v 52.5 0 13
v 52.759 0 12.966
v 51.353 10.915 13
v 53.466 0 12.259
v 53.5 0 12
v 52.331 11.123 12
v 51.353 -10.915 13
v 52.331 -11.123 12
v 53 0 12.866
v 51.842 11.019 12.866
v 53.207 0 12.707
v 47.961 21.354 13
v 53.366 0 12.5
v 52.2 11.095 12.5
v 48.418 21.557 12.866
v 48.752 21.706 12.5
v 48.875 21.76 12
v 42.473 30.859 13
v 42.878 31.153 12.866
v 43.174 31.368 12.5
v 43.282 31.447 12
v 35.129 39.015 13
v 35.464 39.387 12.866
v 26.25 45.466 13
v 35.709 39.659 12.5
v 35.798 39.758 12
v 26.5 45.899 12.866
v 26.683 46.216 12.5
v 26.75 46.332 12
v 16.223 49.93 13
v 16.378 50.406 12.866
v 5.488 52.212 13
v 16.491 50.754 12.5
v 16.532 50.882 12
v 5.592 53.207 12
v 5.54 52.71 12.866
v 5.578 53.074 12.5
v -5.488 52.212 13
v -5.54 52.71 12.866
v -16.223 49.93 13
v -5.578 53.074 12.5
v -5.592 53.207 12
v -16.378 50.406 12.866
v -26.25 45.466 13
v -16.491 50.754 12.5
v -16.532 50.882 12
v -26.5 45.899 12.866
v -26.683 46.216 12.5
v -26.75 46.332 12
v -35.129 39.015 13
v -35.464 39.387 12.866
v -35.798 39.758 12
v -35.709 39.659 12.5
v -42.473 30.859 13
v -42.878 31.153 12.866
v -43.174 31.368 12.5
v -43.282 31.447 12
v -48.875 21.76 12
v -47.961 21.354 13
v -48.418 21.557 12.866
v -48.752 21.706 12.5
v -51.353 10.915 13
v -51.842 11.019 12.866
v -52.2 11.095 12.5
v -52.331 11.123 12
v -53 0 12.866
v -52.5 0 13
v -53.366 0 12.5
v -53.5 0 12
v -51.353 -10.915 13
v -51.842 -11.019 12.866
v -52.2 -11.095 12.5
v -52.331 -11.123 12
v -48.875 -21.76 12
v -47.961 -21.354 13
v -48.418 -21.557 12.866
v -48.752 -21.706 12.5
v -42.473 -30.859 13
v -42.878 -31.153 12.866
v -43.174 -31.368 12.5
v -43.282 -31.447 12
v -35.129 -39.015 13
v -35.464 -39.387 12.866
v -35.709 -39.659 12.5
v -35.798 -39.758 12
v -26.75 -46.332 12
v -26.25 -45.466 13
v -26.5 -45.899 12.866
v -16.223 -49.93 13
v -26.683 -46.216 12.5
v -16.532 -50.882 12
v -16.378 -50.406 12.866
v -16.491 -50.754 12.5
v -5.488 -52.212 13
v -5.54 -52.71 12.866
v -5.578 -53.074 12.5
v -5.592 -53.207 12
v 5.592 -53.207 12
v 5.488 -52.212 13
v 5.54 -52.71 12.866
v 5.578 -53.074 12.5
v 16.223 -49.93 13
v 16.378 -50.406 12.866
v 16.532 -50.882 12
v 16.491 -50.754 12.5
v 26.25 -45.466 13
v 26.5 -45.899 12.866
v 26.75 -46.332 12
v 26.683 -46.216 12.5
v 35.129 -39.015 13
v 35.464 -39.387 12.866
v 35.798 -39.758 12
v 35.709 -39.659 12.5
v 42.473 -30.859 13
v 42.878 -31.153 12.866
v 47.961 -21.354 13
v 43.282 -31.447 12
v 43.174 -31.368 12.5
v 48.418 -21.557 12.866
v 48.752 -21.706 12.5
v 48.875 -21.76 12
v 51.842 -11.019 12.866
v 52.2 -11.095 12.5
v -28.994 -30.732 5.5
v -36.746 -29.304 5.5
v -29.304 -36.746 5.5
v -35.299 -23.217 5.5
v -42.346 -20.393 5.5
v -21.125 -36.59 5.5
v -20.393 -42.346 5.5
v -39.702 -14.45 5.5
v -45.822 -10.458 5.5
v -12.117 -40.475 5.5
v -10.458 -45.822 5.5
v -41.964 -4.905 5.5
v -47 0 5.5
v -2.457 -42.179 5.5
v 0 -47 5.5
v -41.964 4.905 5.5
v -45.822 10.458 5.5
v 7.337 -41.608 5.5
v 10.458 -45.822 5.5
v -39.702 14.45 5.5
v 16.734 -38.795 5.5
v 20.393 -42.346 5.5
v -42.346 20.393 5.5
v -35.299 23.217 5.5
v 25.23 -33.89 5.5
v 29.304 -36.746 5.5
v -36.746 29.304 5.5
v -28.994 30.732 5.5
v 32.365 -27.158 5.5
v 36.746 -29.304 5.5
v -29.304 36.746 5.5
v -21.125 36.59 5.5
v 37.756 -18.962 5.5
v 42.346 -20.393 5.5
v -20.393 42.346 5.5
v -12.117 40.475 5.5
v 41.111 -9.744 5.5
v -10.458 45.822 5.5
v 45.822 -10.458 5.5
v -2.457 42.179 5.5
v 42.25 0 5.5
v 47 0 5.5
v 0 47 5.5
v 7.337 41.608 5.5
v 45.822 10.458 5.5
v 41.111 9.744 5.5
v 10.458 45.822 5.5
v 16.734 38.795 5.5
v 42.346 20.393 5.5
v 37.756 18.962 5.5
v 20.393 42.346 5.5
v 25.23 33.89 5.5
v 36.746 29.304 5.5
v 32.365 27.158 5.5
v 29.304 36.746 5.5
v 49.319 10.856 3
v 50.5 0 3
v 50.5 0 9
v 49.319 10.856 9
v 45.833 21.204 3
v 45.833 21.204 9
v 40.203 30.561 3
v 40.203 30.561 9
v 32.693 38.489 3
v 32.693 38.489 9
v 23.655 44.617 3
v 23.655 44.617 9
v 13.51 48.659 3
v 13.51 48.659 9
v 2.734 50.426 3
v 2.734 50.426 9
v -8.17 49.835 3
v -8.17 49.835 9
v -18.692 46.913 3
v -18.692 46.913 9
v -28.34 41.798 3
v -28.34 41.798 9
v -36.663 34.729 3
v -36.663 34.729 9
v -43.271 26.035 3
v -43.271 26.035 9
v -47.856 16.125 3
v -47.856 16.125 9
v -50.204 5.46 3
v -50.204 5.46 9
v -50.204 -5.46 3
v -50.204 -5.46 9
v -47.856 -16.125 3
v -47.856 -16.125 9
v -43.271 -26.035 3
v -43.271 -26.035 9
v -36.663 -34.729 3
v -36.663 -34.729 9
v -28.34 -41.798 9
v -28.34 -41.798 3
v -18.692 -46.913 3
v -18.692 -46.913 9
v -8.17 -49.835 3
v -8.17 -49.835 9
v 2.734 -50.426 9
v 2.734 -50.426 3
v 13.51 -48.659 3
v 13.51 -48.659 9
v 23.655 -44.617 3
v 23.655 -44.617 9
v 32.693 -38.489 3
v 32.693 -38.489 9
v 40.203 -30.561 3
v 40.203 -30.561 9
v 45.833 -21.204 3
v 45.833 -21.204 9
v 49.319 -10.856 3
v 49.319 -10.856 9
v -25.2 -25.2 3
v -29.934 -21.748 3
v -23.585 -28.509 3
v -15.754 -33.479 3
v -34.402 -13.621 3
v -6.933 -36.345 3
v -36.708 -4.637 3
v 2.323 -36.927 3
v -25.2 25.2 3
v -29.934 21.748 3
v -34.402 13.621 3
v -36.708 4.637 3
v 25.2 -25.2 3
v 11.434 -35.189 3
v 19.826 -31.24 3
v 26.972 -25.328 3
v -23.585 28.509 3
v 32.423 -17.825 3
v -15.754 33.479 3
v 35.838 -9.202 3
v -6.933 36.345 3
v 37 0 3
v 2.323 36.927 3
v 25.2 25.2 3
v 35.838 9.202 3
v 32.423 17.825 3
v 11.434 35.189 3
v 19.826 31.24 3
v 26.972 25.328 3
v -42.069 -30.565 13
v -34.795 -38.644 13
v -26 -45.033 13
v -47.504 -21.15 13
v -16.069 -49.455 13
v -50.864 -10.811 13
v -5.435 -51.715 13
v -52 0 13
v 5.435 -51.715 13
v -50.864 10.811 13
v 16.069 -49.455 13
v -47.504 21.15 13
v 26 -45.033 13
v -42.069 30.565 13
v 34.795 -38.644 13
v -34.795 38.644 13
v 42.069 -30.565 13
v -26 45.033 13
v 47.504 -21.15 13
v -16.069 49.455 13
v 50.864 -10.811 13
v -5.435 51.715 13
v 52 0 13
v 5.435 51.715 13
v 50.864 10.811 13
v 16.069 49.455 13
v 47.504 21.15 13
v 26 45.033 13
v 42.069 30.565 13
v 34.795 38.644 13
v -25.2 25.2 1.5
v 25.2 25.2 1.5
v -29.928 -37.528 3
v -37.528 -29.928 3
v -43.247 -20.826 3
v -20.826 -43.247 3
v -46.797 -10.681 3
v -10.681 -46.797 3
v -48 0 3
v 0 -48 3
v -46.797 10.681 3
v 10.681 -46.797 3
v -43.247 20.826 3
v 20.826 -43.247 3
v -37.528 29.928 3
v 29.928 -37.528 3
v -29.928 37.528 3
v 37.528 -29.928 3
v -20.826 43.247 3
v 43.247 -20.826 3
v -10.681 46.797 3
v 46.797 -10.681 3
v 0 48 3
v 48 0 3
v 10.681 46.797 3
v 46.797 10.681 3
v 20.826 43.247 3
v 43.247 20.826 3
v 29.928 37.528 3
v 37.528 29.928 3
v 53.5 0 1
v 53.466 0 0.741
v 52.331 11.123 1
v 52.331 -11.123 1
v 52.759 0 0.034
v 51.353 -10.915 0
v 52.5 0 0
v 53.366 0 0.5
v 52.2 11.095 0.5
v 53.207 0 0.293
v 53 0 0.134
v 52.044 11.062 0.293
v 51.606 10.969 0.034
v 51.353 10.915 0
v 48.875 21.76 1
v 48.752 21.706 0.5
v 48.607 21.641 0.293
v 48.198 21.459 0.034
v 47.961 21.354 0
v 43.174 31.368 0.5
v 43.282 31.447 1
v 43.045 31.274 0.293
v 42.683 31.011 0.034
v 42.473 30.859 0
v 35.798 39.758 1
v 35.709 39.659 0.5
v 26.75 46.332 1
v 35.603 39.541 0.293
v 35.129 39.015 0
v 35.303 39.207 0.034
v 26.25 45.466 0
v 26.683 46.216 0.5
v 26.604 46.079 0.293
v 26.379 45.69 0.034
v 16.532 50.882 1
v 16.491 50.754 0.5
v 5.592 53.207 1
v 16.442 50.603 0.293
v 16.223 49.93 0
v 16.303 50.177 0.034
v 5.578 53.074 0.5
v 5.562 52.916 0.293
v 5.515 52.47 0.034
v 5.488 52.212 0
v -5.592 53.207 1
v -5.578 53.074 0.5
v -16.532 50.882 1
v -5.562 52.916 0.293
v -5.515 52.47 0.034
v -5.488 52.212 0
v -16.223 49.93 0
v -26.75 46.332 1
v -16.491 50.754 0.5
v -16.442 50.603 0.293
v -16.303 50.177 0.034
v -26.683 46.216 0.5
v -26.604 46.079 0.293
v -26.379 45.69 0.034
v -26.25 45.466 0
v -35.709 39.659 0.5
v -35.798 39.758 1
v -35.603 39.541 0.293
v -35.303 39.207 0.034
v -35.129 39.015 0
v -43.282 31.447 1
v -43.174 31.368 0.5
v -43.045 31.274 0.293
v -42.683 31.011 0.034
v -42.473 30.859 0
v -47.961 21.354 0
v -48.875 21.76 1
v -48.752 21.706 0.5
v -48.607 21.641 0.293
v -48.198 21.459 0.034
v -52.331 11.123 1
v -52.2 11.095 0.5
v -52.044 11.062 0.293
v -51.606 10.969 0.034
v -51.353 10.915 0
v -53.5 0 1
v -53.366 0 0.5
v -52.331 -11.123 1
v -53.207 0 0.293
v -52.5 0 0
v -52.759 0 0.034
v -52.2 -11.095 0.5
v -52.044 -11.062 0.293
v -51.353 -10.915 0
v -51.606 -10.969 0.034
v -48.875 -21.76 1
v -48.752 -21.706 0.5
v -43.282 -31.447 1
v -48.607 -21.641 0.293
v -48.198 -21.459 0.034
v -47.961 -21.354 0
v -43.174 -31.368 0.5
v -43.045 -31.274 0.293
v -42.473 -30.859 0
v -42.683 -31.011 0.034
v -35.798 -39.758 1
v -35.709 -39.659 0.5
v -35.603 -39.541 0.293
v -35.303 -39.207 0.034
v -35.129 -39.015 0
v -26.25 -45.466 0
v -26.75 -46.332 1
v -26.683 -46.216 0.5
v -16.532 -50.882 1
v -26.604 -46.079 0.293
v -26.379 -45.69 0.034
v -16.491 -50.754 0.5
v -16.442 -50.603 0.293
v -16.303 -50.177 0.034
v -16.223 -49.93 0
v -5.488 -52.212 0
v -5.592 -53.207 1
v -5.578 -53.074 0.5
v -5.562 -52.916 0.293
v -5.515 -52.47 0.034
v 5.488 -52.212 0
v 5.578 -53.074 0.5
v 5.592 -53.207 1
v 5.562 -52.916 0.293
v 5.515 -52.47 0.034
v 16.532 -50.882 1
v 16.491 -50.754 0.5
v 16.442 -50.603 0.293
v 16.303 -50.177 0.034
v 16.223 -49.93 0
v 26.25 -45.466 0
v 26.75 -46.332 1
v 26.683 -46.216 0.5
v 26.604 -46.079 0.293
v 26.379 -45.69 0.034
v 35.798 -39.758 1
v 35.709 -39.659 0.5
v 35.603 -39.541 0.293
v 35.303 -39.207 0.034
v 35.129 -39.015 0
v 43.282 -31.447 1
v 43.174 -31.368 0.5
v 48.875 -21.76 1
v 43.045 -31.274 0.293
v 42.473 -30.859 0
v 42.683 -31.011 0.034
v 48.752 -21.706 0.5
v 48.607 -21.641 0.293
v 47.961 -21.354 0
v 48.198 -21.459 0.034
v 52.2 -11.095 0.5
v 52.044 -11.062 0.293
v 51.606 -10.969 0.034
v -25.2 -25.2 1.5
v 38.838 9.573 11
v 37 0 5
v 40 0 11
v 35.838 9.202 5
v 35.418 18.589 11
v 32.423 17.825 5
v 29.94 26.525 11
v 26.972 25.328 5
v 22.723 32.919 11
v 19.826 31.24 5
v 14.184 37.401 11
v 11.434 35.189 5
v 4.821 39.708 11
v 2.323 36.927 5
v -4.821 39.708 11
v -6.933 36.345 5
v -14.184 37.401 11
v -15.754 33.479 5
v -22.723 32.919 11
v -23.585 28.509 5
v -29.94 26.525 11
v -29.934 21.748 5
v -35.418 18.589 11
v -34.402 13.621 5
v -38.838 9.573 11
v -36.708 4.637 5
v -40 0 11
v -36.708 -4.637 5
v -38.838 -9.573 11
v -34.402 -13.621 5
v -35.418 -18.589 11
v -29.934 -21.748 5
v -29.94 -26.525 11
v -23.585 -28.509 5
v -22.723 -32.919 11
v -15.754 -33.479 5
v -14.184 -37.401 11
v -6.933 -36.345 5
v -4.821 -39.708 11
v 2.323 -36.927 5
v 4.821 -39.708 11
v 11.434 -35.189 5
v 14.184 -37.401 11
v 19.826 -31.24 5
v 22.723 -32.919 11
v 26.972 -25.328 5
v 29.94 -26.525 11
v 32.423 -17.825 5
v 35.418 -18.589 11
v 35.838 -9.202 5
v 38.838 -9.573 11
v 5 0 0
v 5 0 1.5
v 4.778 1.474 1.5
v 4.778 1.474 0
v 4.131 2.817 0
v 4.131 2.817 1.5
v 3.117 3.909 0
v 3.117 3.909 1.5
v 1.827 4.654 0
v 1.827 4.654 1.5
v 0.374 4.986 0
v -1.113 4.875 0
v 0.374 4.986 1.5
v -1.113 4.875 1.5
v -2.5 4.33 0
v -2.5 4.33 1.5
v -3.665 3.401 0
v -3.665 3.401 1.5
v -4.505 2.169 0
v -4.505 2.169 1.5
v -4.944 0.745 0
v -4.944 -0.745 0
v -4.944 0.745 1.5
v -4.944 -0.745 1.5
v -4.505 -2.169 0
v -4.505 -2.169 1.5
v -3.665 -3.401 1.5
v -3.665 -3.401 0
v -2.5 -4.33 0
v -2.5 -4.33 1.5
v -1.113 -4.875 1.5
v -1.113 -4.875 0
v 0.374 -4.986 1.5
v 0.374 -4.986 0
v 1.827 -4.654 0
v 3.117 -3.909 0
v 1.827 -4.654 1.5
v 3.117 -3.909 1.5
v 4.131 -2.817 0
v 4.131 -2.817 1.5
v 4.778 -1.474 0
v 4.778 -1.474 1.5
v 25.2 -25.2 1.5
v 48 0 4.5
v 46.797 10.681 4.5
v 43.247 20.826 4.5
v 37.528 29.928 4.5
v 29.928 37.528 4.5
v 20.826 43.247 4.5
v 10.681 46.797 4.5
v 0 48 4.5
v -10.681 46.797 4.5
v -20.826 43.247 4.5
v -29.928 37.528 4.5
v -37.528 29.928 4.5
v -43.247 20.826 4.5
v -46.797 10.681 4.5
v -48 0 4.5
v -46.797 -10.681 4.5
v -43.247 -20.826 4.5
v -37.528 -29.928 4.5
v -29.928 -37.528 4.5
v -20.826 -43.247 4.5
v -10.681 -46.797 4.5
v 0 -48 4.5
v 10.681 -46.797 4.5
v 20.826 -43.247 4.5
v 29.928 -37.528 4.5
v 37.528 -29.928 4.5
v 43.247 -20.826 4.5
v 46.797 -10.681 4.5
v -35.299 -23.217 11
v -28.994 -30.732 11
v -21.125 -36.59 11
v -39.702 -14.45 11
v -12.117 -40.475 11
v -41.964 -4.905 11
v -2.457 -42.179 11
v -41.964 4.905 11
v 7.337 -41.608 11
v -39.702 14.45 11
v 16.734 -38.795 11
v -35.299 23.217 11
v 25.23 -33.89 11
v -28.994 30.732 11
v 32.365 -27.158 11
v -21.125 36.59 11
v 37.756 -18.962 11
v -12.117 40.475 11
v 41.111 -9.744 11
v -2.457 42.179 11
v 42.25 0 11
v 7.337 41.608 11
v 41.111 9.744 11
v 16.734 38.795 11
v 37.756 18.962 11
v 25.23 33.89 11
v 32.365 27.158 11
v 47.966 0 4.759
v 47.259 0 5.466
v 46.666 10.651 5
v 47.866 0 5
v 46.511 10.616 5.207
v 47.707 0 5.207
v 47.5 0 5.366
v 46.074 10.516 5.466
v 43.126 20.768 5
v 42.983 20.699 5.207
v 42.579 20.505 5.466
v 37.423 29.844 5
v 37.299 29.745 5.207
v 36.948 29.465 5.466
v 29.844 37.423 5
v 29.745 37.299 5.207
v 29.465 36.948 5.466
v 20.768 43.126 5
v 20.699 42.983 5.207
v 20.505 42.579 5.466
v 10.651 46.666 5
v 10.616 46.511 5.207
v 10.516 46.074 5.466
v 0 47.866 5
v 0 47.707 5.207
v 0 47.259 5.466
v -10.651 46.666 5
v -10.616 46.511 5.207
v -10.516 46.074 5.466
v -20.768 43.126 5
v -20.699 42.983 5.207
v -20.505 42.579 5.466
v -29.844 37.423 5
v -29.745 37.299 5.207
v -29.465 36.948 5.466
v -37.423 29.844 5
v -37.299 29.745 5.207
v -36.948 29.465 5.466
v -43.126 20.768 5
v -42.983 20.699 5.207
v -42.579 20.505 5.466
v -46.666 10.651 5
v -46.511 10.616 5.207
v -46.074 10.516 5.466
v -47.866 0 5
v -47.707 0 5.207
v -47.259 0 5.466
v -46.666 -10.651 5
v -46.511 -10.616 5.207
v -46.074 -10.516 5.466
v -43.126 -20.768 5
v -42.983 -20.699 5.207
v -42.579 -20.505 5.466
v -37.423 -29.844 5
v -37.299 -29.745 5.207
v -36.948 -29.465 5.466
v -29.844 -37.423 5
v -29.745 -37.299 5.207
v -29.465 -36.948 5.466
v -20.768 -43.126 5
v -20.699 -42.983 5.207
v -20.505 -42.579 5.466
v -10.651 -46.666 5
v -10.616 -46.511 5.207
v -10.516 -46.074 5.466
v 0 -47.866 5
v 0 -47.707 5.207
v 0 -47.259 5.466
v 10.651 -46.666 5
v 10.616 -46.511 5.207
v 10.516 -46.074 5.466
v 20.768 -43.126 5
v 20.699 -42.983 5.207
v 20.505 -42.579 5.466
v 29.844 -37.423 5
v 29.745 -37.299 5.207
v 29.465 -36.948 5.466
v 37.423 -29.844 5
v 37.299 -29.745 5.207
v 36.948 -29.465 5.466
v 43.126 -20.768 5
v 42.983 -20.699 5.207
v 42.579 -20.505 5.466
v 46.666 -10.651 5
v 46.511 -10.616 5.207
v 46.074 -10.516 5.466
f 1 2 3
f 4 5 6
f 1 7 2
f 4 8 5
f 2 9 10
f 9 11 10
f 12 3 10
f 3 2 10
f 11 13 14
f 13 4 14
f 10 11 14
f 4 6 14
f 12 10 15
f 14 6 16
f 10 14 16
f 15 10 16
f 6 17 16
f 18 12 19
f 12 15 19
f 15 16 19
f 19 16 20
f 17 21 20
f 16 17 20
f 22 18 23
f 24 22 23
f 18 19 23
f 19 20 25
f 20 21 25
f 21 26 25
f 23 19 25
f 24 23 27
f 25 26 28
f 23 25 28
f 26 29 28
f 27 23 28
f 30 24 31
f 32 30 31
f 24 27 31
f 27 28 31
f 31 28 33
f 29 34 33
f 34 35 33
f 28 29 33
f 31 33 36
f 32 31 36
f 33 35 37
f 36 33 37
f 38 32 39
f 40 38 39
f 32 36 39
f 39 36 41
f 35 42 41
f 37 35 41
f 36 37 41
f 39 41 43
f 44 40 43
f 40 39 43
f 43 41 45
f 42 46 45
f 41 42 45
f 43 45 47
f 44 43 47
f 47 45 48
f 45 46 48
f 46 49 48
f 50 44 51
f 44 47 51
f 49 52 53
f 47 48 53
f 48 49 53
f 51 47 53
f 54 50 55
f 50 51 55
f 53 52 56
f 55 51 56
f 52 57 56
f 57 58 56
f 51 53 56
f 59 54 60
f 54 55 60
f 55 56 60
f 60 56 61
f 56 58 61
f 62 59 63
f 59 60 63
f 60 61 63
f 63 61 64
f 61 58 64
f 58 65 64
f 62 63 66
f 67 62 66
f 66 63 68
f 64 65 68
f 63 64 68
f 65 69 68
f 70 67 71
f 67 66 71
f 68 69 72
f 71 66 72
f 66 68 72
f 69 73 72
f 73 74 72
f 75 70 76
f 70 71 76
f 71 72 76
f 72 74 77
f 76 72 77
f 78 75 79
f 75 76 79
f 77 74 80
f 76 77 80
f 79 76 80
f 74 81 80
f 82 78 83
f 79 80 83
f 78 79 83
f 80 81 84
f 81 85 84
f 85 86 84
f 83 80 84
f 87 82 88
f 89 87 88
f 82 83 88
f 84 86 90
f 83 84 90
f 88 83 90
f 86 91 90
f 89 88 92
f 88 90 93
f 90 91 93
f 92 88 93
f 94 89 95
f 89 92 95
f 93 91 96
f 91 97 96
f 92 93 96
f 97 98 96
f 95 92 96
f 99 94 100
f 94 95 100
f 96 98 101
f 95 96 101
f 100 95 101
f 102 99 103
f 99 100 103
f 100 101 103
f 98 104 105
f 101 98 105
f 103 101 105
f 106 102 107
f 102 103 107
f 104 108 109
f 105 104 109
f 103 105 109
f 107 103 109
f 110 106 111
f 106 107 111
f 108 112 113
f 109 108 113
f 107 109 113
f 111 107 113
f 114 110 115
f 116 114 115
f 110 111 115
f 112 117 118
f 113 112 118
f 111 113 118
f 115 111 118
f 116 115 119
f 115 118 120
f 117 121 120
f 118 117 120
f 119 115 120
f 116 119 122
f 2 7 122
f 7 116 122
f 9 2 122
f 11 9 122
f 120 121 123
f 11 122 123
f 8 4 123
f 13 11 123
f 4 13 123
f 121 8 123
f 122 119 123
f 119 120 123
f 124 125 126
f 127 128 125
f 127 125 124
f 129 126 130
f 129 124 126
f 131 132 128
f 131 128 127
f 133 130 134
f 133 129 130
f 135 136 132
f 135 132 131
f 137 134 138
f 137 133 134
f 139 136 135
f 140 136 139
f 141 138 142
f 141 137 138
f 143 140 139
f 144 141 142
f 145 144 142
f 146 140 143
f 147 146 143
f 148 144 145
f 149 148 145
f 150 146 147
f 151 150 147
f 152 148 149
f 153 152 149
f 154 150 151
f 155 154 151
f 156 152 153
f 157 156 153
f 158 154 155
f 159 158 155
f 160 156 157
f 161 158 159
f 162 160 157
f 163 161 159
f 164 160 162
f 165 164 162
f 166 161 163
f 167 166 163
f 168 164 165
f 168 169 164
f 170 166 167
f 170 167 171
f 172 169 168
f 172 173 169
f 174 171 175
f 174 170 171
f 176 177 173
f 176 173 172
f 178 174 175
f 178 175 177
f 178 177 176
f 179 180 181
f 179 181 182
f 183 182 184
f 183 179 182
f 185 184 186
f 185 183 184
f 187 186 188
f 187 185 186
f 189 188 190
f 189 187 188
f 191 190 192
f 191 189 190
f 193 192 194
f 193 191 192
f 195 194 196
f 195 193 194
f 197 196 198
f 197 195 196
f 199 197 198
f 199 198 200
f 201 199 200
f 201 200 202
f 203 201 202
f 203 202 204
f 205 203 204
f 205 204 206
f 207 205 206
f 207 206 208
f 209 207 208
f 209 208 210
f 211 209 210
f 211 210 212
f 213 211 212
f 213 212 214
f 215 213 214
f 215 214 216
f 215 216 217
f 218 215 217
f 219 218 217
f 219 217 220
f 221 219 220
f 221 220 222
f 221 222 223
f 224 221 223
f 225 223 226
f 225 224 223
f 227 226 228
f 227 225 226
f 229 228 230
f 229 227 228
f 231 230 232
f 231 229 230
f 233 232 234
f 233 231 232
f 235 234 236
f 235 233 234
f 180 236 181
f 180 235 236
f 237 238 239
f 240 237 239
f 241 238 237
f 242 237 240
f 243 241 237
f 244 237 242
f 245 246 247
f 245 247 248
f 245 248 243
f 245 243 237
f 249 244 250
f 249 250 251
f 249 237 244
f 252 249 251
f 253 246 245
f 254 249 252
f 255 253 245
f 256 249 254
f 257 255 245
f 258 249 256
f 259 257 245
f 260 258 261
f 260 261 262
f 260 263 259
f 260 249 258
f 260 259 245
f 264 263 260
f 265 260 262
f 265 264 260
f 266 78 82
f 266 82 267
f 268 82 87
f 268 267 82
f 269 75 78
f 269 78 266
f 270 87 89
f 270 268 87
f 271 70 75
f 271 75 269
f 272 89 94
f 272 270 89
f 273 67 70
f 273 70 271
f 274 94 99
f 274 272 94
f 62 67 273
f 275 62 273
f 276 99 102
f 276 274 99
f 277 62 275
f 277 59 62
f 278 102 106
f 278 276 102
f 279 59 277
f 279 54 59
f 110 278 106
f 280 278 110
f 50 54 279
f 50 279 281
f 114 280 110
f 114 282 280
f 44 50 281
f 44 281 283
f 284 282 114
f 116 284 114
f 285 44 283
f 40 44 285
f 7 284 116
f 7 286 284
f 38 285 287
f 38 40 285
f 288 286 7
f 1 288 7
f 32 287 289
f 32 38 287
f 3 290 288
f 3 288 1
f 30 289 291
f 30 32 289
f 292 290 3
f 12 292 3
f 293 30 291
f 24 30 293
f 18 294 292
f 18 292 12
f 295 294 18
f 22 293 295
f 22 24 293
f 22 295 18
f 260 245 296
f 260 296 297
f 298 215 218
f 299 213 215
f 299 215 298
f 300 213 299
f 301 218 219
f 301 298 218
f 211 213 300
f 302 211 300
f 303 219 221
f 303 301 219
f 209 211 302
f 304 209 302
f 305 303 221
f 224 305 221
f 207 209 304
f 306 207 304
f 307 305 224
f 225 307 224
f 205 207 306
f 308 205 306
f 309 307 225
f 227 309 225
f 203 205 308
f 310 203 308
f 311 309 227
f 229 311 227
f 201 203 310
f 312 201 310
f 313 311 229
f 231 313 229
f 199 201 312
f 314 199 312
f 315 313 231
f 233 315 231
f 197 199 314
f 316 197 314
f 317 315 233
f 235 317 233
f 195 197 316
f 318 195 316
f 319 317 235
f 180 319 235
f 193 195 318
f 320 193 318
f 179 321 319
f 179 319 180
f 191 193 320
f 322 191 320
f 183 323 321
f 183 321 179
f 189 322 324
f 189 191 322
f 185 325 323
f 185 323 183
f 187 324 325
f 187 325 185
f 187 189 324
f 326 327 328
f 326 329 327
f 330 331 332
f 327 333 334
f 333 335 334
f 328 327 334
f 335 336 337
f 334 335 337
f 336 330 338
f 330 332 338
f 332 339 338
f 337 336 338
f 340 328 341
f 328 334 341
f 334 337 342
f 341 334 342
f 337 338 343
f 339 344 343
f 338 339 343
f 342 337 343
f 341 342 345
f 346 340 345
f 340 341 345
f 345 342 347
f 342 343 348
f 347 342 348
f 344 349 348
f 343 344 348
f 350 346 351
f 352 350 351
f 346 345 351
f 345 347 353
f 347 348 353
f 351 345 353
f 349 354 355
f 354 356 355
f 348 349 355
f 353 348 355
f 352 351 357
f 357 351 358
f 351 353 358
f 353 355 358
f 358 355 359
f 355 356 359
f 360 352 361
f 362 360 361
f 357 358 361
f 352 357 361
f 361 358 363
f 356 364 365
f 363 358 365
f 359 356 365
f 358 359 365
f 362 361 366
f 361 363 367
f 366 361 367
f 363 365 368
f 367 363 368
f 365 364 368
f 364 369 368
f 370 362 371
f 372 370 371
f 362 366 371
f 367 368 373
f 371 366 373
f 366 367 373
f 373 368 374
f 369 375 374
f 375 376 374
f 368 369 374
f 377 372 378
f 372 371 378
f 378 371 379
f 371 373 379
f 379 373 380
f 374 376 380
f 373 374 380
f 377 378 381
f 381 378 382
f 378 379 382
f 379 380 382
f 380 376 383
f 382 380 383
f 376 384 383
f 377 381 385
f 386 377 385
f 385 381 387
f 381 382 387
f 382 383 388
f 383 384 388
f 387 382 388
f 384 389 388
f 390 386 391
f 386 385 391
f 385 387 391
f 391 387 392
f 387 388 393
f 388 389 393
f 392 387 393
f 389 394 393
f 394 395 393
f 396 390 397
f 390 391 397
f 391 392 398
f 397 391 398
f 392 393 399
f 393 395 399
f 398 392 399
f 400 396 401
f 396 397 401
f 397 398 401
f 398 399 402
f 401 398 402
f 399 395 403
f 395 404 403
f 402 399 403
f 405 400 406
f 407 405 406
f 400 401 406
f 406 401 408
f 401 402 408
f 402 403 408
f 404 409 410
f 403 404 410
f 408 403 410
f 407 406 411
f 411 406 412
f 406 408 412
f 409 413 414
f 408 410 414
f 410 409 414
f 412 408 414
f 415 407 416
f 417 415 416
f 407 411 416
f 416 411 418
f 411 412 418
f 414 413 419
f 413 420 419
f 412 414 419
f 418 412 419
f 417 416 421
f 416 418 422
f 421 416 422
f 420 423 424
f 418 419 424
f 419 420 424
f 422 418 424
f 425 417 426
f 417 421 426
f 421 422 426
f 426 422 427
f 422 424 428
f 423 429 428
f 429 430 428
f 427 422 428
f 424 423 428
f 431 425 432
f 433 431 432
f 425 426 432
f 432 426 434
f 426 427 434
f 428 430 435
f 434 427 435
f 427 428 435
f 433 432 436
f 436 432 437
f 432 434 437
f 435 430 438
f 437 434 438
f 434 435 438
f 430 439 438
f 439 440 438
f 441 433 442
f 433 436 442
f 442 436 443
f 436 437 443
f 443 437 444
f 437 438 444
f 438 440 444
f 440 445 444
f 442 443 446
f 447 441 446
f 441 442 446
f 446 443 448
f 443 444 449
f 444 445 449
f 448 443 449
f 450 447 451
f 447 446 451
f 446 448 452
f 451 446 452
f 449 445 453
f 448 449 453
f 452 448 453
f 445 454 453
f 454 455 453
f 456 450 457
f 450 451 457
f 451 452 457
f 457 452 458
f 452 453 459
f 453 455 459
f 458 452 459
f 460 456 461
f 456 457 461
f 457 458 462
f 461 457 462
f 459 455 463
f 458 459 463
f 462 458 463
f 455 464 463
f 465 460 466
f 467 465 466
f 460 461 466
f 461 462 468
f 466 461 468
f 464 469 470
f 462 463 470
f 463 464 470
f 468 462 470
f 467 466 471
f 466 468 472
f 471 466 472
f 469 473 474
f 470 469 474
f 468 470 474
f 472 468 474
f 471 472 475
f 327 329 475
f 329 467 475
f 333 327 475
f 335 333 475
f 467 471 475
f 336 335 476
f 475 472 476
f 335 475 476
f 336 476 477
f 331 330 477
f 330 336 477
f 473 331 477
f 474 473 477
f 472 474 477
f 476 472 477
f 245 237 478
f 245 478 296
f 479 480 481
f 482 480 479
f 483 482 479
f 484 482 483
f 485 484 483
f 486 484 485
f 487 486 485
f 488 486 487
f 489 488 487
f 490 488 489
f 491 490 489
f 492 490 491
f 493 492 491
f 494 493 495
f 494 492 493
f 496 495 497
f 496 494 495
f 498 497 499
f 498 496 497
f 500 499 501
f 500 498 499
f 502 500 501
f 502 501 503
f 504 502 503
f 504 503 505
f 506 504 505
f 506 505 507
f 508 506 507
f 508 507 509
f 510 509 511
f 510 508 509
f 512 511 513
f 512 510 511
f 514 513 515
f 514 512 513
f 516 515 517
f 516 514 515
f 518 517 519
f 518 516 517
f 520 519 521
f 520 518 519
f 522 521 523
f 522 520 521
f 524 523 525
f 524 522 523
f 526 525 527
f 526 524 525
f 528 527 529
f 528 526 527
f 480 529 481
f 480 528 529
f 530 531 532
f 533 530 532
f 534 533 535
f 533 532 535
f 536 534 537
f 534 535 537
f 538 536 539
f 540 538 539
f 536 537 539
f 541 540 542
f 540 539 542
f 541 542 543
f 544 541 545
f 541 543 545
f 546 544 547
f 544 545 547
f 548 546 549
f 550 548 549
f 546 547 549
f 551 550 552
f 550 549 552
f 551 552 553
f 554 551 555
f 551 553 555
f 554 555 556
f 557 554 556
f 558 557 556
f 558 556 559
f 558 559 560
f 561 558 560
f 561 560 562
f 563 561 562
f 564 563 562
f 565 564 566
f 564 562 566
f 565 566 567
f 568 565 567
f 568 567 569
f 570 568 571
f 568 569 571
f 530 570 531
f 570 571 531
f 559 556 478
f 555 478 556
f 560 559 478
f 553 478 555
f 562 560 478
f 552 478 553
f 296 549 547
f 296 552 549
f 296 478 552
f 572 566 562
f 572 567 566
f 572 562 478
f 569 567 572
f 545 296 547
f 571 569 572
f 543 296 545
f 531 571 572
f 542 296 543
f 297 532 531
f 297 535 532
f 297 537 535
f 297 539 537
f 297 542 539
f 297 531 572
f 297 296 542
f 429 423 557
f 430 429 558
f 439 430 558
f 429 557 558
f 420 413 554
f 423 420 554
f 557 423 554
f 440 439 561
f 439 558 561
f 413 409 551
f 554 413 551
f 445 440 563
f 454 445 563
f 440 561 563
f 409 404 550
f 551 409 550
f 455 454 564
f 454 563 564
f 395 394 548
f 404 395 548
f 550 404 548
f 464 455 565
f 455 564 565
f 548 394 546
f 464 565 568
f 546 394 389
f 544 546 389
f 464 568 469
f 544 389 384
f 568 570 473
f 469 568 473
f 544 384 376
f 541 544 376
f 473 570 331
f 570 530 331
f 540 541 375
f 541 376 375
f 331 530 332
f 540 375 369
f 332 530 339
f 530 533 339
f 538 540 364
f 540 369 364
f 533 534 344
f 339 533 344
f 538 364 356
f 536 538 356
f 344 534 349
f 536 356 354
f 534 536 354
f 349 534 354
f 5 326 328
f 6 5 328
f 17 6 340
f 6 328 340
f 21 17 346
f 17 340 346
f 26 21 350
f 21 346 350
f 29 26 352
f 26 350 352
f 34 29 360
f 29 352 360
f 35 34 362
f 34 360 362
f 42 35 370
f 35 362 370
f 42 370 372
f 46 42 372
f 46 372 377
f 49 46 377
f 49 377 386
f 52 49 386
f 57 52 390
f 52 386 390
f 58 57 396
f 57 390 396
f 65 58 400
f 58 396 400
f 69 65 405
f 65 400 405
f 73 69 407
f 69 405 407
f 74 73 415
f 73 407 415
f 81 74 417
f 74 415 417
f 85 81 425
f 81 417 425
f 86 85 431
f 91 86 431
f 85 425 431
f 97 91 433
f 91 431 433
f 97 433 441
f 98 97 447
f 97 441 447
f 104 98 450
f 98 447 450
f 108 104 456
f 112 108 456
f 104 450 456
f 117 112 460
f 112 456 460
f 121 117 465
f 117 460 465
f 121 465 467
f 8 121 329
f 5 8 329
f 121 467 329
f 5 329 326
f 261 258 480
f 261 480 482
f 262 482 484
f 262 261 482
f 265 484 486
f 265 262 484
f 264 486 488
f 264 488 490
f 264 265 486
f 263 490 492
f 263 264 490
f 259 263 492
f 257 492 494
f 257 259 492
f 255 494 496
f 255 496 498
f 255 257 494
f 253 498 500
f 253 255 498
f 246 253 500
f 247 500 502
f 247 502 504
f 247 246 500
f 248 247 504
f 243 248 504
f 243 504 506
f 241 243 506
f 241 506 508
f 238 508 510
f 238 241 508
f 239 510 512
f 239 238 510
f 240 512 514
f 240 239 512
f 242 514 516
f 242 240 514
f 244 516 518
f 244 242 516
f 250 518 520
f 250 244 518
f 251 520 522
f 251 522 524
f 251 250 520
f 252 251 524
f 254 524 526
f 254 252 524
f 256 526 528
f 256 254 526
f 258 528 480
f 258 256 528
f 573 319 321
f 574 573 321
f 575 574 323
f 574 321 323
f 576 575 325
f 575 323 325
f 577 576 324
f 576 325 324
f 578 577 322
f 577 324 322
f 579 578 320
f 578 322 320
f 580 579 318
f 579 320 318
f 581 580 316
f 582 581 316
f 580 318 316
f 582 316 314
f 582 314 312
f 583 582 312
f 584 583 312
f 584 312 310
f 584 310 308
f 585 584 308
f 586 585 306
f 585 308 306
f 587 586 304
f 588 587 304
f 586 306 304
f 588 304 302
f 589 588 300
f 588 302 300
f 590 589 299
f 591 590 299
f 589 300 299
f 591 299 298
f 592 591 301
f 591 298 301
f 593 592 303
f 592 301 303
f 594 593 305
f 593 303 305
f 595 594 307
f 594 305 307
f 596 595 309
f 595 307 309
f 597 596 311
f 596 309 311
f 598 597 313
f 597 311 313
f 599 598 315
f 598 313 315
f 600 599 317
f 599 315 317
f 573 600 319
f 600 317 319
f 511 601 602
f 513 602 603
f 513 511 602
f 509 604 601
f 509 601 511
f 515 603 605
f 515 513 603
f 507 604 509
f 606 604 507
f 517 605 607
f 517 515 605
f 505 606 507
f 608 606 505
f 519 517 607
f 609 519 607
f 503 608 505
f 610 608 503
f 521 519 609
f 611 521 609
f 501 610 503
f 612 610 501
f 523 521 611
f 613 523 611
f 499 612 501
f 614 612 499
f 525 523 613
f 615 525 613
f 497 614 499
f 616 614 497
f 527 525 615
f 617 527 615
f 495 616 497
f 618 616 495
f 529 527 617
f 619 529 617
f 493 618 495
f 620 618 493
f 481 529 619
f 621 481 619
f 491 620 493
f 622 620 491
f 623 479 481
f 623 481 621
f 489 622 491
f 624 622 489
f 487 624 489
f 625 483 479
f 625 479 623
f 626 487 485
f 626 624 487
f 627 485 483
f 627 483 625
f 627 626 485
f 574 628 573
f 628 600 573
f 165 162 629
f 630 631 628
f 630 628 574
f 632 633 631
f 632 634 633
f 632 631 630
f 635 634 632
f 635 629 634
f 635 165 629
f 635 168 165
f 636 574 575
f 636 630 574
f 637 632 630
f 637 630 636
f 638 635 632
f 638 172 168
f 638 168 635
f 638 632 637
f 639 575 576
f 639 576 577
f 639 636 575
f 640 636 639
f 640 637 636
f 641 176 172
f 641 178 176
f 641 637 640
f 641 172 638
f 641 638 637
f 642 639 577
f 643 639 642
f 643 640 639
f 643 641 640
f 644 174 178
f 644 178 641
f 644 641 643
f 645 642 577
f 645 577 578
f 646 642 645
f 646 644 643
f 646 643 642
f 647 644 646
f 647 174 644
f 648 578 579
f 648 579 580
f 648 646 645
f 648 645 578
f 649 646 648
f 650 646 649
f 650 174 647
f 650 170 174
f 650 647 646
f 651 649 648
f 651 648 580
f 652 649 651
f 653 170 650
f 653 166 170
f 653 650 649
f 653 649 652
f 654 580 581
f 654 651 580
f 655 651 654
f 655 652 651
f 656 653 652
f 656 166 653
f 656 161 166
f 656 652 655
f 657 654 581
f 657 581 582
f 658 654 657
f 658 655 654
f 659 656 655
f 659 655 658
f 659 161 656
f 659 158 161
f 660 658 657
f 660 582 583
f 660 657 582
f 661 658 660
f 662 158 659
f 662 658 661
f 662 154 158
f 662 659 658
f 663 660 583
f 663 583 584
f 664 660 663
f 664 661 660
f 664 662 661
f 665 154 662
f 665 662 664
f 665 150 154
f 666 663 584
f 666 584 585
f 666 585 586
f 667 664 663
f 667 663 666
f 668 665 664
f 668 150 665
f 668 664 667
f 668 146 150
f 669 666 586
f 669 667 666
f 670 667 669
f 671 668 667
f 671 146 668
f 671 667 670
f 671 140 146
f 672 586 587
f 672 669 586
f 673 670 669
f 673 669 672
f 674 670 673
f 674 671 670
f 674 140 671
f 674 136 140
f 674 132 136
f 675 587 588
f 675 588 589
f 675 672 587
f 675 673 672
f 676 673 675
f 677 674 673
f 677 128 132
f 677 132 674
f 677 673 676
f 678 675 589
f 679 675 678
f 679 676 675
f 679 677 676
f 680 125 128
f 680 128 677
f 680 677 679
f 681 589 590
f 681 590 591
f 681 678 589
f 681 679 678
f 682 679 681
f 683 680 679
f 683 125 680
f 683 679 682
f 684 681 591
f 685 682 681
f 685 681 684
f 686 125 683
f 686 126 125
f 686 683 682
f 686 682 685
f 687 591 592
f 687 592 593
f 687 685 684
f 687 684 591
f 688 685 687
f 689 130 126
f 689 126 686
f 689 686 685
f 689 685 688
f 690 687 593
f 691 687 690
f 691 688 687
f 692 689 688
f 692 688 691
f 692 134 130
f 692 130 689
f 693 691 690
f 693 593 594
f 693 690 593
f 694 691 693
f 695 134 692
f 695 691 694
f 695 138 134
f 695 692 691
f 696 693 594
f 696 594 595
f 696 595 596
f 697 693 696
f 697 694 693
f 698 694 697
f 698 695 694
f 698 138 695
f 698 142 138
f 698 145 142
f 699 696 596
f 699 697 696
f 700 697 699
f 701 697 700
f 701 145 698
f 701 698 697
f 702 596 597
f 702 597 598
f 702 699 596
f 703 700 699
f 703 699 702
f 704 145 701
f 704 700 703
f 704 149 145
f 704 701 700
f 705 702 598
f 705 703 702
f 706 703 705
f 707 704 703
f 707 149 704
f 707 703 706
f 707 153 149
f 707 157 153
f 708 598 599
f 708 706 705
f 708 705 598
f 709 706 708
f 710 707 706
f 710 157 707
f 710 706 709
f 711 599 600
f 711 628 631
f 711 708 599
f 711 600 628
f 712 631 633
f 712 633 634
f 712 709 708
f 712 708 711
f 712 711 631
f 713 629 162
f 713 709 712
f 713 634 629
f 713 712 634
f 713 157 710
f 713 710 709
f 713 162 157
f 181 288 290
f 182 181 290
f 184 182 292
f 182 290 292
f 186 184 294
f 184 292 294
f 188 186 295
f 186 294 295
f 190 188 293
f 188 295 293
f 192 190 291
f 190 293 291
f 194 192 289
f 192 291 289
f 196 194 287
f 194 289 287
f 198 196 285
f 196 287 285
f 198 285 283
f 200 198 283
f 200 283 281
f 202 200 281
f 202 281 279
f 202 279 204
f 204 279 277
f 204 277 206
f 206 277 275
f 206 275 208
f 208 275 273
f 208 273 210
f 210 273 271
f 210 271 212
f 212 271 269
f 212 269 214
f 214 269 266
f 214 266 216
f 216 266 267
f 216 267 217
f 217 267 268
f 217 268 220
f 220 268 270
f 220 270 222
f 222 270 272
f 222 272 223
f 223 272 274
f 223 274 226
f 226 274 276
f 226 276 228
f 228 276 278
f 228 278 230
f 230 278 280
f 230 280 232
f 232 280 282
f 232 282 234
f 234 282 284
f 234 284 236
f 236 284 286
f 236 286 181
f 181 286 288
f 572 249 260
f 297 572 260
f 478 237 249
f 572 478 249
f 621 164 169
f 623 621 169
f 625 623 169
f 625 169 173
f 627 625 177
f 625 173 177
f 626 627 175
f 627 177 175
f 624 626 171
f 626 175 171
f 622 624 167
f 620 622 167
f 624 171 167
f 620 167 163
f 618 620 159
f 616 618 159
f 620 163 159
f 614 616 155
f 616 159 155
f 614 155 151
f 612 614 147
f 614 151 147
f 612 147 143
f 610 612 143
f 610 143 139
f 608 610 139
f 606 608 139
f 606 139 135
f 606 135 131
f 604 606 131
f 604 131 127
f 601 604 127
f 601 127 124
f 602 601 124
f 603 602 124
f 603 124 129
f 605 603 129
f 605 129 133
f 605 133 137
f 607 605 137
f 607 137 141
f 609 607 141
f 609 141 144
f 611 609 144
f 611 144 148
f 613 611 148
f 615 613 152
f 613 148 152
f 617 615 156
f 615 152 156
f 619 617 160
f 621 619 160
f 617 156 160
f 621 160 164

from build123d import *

# Parameters (mm, degrees)
F0_R      = 53.5
F1_DEPTH  = 13
F2_T      = -3
F3_R      = 48
F3_R_2    = 42.25
F3_R_3    = 37
F4_DEPTH  = 2.5
F5_DEPTH  = 8
F6_SIZE2  = 6
F6_SIZE   = 3
F7_SIZE2  = 1.5
F7_SIZE   = 4
F8_R      = 1
F9_R      = 5
F10_DEPTH = 45.7
F11_W     = 50.4
F11_H     = 50.4
F12_DEPTH = 1.5


with BuildPart() as f1:
    # F0 (on Top) → F1 (new body)
    with BuildSketch(Plane.XY):
        Circle(F0_R)
    extrude(amount=F1_DEPTH)

    # F2
    f2_openings = [f1.faces().sort_by_distance(p)[0] for p in [
        (0, 0, 13),
    ]]
    offset(amount=F2_T, openings=f2_openings)

    # F3 (on face) → F4 (join)
    with BuildSketch(Plane.XY.offset(3)):
        Circle(F3_R)
        Circle(F3_R_2, mode=Mode.SUBTRACT)
        Circle(F3_R_2)
        Circle(F3_R_3, mode=Mode.SUBTRACT)
    extrude(amount=F4_DEPTH)

    # F3 (on face) → F5 (join)
    with BuildSketch(Plane.XY.offset(3)):
        Circle(F3_R_2)
        Circle(F3_R_3, mode=Mode.SUBTRACT)
    extrude(amount=F5_DEPTH)

    # F6
    f6_edges = [f1.edges().sort_by_distance(p)[0] for p in [
        (-37, 0, 11),
    ]]
    f6_side = f1.faces().sort_by_distance((-41.05499, 0, 11))[0]
    chamfer(f6_edges, length=F6_SIZE, length2=F6_SIZE2, reference=f6_side)

    # F7
    f7_edges = [f1.edges().sort_by_distance(p)[0] for p in [
        (-50.5, 0, 13),
    ]]
    chamfer(f7_edges, length=F7_SIZE, length2=F7_SIZE2)

    # F8
    f8_edges = [f1.edges().sort_by_distance(p)[0] for p in [
        (-48, 0, 5.5),
        (-53.5, 0, 0),
        (-53.5, 0, 13),
    ]]
    fillet(f8_edges, radius=F8_R)

    # F9 (on face) → F10 (cut, symmetric)
    with BuildSketch(Plane.XY.offset(5.5)):
        Circle(F9_R)
    extrude(amount=F10_DEPTH, both=True, mode=Mode.SUBTRACT)

    # F11 (on face) → F12 (cut)
    with BuildSketch(Plane.XY.offset(3)):
        Rectangle(F11_W, F11_H)
    extrude(amount=-F12_DEPTH, mode=Mode.SUBTRACT)


solid = f1.part
